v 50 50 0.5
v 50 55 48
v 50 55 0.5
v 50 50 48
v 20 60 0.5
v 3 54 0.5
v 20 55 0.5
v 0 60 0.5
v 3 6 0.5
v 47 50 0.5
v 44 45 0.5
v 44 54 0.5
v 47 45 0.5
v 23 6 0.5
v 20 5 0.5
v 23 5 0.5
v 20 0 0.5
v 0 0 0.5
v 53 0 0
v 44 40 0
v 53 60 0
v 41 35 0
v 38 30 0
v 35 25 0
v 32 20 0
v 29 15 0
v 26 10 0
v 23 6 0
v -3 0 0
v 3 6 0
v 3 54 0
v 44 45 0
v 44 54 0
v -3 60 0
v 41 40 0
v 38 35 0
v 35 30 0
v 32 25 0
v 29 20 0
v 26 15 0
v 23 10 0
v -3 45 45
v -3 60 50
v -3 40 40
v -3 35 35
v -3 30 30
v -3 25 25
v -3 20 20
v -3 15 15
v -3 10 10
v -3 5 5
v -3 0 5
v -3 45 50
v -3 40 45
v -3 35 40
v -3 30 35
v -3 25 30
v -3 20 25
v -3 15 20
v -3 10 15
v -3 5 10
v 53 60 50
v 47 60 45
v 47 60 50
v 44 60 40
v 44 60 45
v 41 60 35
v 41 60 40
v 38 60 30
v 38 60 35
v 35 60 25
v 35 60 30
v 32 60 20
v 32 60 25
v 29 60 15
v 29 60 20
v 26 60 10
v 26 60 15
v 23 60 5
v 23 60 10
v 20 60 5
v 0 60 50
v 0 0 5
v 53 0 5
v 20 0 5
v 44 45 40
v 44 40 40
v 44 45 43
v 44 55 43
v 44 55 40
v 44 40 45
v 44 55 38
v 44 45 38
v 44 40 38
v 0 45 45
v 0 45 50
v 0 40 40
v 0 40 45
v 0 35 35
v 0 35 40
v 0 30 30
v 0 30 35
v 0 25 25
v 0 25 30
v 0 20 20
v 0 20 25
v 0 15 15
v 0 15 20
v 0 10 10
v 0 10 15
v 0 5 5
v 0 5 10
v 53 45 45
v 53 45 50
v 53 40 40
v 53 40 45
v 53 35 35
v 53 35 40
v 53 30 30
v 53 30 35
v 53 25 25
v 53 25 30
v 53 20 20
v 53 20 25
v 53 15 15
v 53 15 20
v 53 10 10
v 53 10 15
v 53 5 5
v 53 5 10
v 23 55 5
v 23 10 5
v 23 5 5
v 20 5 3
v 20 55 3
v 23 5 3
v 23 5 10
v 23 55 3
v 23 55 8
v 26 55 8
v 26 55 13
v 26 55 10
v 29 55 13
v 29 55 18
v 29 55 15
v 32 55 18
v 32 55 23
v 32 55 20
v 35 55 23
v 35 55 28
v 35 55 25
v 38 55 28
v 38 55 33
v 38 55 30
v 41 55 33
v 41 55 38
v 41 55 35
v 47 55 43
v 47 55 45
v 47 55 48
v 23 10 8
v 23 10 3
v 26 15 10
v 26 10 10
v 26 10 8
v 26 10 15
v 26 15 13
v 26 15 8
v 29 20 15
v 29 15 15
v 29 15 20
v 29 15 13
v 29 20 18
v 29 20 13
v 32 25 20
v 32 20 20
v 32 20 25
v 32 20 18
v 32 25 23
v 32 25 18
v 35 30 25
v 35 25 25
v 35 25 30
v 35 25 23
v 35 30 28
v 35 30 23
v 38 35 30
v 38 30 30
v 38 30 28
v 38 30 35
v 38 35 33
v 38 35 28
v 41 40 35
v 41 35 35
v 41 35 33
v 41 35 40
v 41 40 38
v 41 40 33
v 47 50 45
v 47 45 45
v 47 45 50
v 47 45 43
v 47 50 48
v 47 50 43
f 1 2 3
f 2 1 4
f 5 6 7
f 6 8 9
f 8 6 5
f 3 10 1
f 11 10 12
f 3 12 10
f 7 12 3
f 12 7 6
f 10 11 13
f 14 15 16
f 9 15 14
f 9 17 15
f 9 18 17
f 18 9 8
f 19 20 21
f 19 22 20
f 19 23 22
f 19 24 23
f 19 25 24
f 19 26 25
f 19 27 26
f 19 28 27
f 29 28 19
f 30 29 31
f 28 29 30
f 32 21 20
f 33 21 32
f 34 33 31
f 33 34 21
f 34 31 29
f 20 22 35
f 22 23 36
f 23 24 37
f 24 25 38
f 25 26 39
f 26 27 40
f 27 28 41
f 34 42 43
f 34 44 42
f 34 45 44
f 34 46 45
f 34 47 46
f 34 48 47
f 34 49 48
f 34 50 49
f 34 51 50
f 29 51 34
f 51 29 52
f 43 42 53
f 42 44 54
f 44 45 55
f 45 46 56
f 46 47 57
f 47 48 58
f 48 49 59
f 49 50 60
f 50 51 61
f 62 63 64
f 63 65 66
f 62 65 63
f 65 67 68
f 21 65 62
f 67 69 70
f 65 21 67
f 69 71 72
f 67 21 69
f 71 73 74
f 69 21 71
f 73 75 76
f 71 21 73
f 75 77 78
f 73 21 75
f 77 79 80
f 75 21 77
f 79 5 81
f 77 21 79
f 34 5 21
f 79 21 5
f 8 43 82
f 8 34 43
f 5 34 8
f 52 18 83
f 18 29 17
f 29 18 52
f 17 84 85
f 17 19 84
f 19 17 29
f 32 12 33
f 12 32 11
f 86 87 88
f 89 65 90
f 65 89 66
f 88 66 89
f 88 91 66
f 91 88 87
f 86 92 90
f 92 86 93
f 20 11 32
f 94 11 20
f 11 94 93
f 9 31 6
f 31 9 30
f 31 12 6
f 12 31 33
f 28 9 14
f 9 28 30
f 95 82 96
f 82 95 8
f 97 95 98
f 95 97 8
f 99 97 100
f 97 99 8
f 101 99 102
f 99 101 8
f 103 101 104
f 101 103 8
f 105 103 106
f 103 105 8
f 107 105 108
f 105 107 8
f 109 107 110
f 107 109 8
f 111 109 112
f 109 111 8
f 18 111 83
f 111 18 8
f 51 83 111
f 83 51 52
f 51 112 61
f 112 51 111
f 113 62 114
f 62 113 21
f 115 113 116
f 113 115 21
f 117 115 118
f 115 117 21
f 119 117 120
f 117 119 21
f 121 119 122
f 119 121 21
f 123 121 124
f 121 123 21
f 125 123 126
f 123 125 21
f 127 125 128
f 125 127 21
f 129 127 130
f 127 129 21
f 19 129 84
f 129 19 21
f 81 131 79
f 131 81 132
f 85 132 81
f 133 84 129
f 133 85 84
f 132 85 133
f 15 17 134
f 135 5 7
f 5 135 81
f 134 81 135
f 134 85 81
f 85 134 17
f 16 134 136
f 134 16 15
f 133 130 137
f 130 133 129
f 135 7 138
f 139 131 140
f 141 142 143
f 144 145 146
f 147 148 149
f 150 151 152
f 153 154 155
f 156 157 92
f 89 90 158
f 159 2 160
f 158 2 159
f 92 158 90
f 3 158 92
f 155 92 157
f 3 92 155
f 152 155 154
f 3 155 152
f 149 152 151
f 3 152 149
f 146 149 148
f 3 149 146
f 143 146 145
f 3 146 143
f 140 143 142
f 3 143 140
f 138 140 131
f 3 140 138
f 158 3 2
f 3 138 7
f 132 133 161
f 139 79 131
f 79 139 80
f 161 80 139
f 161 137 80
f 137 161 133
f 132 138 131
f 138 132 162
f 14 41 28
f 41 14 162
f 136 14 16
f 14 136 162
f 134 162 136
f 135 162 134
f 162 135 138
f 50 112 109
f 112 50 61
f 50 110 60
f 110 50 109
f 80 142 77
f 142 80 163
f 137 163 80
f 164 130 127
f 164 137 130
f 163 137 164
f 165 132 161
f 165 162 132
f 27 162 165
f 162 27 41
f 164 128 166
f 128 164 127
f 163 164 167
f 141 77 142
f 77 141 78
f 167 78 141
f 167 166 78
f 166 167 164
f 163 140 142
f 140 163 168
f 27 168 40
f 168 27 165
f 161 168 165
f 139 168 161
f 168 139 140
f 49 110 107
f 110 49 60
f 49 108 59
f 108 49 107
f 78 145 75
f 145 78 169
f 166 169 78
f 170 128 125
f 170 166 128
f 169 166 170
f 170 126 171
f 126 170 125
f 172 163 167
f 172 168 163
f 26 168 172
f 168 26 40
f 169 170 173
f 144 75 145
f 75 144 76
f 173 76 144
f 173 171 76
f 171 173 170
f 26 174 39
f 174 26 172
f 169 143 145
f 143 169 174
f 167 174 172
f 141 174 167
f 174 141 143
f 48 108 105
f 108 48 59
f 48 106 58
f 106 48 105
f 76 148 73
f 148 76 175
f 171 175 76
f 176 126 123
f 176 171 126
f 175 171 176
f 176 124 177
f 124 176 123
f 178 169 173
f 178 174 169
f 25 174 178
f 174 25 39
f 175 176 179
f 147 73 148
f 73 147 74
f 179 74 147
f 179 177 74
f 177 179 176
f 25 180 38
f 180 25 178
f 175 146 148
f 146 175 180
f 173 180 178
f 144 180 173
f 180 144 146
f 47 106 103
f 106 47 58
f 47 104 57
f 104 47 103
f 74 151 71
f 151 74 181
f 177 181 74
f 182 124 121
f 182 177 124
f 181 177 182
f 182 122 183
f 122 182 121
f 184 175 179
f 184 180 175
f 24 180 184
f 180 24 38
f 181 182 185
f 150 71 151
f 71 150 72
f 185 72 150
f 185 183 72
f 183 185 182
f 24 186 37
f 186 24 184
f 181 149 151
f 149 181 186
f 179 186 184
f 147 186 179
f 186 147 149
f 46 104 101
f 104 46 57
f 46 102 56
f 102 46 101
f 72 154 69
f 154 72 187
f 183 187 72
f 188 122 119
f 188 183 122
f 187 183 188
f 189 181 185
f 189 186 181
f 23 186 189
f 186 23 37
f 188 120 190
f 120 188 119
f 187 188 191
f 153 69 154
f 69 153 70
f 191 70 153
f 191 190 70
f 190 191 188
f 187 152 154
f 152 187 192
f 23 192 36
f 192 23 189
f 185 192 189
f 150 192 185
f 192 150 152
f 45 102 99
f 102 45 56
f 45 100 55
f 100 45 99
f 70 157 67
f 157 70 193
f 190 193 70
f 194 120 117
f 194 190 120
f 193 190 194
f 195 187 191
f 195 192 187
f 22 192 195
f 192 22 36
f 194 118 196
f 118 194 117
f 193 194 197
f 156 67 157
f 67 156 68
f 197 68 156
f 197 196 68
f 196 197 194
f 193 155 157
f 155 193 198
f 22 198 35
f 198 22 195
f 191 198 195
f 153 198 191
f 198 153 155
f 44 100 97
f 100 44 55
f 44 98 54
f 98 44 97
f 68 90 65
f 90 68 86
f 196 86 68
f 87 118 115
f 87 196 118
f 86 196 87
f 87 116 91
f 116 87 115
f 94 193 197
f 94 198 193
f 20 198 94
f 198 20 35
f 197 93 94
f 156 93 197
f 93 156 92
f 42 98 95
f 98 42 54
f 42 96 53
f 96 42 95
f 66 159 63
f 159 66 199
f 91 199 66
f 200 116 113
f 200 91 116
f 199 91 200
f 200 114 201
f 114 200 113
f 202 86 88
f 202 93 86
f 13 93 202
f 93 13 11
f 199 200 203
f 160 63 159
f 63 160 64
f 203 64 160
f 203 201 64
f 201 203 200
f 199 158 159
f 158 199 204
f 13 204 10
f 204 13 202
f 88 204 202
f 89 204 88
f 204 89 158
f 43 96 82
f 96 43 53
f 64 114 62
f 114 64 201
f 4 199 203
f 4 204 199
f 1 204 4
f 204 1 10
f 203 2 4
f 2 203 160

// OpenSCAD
// ***********
// * SUMMARY *
// ***********

//Flow rate and feed rate are no longer difficult to calibrate, thanks to stepper extruders. However, to really get your print quality to the next level, you will need to calibrate temperature and reversal settings for a given material. (and/or travel feed rate, depending on your machine) This is a fully parametric calibration test for both bridging and gap distances within the same part.

//Bridging is a great test for temperature. If the bridge is too saggy, the temperature is too high. There are also some advantages to higher temperatures though, one of which is it makes the thermoplastic less viscous, creating less work for the motor. If your preference is printing really hot, a fan concentrating cool air on the extrudate can also be used to calibrate bridging.

//Traversing large gaps is obviously a great test for reversal/travel speed settings. Set extra shells to 0 to avoid hiding any ooze behind inner perimeters. Make the infill very low to save printing time since you only care about spanning gaps for this test. Use a camera for feedback if you are extra picky about strings.

// ****************
// * INSTRUCTIONS *
// ****************

//To customize your test, open the script with OpenSCAD, and edit the variables labeled at the top. Once you are finished, select "Compile and Render" or press F6.

//PRIMARY INPUTS
//minimum reversal gap distance (mm)
//maximum reversal gap distance (mm)
//minimum bridging distance (mm)
//maximum bridging distance (mm)
//number of steps
//total height of object (mm)

//SECONDARY INPUTS
//width of vertical tower (mm)
//width of border on base plane (mm)
//thickness of border on base plane (mm)
//thickness of bridges (mm)

//PRIMARY INPUTS
gdmin = 20;     //minimum reversal gap distance (mm)
gdmax = 50;	//maximum reversal gap distance (mm)	
bdmin = 10;	//minimum bridging distance (mm)
bdmax = 60;	//maximum bridging distance (mm)
increment = 10;    //number of steps
height = 50;     //total height of object (mm)

//SECONDARY INPUTS
towerwidth = 3;     //width of vertical tower (mm)
borderwidth = 6;     //width of border on base plane (mm)
borderthickness = 0.5;     //thickness of border on base plane (mm)
bridgethickness = 2;     //thickness of bridges (mm)

//Script
xstepsize = (gdmax-gdmin)/increment; 
ystepsize = (bdmax-bdmin)/(increment);
zstepsize = height/increment;

union(){

difference(){
translate([-towerwidth,0,0]) cube([gdmin+xstepsize*(increment+1),ystepsize*(increment+2),borderthickness]);

translate([-towerwidth+borderwidth,borderwidth,0]) cube([gdmin+xstepsize*(increment+1)-2*borderwidth,ystepsize*(increment+2)-2*borderwidth,borderthickness]);
}

for(i=[0:increment-1]){
translate([-towerwidth,0+ystepsize*i,0])cube([towerwidth,ystepsize,zstepsize+zstepsize*i]);  //tower

translate([gdmin+xstepsize*i,0+ystepsize*i,0]) cube([(xstepsize+gdmax-gdmin)-xstepsize*i,ystepsize, zstepsize+zstepsize*i]);  //stairs

translate([gdmin+xstepsize*i,(ystepsize*increment)+ystepsize,0]) cube([(xstepsize+gdmax-gdmin)-xstepsize*i,ystepsize,zstepsize+zstepsize*i]);   //back tower

translate([gdmin+xstepsize*i,0+ystepsize*i,zstepsize+zstepsize*i-bridgethickness]) cube([xstepsize,ystepsize*(increment+1)-ystepsize*i,bridgethickness]);   //bridge
}

for(j=[increment:increment+1]){
translate([-towerwidth,ystepsize*j,0])cube([towerwidth,ystepsize,zstepsize+zstepsize*(increment-1)]);  //tower addon

translate([gdmin+xstepsize*increment,ystepsize*j,0]) cube([(xstepsize+gdmax-gdmin)-xstepsize*increment,ystepsize, zstepsize+zstepsize*(increment-1)]);   //top stair
}

}
